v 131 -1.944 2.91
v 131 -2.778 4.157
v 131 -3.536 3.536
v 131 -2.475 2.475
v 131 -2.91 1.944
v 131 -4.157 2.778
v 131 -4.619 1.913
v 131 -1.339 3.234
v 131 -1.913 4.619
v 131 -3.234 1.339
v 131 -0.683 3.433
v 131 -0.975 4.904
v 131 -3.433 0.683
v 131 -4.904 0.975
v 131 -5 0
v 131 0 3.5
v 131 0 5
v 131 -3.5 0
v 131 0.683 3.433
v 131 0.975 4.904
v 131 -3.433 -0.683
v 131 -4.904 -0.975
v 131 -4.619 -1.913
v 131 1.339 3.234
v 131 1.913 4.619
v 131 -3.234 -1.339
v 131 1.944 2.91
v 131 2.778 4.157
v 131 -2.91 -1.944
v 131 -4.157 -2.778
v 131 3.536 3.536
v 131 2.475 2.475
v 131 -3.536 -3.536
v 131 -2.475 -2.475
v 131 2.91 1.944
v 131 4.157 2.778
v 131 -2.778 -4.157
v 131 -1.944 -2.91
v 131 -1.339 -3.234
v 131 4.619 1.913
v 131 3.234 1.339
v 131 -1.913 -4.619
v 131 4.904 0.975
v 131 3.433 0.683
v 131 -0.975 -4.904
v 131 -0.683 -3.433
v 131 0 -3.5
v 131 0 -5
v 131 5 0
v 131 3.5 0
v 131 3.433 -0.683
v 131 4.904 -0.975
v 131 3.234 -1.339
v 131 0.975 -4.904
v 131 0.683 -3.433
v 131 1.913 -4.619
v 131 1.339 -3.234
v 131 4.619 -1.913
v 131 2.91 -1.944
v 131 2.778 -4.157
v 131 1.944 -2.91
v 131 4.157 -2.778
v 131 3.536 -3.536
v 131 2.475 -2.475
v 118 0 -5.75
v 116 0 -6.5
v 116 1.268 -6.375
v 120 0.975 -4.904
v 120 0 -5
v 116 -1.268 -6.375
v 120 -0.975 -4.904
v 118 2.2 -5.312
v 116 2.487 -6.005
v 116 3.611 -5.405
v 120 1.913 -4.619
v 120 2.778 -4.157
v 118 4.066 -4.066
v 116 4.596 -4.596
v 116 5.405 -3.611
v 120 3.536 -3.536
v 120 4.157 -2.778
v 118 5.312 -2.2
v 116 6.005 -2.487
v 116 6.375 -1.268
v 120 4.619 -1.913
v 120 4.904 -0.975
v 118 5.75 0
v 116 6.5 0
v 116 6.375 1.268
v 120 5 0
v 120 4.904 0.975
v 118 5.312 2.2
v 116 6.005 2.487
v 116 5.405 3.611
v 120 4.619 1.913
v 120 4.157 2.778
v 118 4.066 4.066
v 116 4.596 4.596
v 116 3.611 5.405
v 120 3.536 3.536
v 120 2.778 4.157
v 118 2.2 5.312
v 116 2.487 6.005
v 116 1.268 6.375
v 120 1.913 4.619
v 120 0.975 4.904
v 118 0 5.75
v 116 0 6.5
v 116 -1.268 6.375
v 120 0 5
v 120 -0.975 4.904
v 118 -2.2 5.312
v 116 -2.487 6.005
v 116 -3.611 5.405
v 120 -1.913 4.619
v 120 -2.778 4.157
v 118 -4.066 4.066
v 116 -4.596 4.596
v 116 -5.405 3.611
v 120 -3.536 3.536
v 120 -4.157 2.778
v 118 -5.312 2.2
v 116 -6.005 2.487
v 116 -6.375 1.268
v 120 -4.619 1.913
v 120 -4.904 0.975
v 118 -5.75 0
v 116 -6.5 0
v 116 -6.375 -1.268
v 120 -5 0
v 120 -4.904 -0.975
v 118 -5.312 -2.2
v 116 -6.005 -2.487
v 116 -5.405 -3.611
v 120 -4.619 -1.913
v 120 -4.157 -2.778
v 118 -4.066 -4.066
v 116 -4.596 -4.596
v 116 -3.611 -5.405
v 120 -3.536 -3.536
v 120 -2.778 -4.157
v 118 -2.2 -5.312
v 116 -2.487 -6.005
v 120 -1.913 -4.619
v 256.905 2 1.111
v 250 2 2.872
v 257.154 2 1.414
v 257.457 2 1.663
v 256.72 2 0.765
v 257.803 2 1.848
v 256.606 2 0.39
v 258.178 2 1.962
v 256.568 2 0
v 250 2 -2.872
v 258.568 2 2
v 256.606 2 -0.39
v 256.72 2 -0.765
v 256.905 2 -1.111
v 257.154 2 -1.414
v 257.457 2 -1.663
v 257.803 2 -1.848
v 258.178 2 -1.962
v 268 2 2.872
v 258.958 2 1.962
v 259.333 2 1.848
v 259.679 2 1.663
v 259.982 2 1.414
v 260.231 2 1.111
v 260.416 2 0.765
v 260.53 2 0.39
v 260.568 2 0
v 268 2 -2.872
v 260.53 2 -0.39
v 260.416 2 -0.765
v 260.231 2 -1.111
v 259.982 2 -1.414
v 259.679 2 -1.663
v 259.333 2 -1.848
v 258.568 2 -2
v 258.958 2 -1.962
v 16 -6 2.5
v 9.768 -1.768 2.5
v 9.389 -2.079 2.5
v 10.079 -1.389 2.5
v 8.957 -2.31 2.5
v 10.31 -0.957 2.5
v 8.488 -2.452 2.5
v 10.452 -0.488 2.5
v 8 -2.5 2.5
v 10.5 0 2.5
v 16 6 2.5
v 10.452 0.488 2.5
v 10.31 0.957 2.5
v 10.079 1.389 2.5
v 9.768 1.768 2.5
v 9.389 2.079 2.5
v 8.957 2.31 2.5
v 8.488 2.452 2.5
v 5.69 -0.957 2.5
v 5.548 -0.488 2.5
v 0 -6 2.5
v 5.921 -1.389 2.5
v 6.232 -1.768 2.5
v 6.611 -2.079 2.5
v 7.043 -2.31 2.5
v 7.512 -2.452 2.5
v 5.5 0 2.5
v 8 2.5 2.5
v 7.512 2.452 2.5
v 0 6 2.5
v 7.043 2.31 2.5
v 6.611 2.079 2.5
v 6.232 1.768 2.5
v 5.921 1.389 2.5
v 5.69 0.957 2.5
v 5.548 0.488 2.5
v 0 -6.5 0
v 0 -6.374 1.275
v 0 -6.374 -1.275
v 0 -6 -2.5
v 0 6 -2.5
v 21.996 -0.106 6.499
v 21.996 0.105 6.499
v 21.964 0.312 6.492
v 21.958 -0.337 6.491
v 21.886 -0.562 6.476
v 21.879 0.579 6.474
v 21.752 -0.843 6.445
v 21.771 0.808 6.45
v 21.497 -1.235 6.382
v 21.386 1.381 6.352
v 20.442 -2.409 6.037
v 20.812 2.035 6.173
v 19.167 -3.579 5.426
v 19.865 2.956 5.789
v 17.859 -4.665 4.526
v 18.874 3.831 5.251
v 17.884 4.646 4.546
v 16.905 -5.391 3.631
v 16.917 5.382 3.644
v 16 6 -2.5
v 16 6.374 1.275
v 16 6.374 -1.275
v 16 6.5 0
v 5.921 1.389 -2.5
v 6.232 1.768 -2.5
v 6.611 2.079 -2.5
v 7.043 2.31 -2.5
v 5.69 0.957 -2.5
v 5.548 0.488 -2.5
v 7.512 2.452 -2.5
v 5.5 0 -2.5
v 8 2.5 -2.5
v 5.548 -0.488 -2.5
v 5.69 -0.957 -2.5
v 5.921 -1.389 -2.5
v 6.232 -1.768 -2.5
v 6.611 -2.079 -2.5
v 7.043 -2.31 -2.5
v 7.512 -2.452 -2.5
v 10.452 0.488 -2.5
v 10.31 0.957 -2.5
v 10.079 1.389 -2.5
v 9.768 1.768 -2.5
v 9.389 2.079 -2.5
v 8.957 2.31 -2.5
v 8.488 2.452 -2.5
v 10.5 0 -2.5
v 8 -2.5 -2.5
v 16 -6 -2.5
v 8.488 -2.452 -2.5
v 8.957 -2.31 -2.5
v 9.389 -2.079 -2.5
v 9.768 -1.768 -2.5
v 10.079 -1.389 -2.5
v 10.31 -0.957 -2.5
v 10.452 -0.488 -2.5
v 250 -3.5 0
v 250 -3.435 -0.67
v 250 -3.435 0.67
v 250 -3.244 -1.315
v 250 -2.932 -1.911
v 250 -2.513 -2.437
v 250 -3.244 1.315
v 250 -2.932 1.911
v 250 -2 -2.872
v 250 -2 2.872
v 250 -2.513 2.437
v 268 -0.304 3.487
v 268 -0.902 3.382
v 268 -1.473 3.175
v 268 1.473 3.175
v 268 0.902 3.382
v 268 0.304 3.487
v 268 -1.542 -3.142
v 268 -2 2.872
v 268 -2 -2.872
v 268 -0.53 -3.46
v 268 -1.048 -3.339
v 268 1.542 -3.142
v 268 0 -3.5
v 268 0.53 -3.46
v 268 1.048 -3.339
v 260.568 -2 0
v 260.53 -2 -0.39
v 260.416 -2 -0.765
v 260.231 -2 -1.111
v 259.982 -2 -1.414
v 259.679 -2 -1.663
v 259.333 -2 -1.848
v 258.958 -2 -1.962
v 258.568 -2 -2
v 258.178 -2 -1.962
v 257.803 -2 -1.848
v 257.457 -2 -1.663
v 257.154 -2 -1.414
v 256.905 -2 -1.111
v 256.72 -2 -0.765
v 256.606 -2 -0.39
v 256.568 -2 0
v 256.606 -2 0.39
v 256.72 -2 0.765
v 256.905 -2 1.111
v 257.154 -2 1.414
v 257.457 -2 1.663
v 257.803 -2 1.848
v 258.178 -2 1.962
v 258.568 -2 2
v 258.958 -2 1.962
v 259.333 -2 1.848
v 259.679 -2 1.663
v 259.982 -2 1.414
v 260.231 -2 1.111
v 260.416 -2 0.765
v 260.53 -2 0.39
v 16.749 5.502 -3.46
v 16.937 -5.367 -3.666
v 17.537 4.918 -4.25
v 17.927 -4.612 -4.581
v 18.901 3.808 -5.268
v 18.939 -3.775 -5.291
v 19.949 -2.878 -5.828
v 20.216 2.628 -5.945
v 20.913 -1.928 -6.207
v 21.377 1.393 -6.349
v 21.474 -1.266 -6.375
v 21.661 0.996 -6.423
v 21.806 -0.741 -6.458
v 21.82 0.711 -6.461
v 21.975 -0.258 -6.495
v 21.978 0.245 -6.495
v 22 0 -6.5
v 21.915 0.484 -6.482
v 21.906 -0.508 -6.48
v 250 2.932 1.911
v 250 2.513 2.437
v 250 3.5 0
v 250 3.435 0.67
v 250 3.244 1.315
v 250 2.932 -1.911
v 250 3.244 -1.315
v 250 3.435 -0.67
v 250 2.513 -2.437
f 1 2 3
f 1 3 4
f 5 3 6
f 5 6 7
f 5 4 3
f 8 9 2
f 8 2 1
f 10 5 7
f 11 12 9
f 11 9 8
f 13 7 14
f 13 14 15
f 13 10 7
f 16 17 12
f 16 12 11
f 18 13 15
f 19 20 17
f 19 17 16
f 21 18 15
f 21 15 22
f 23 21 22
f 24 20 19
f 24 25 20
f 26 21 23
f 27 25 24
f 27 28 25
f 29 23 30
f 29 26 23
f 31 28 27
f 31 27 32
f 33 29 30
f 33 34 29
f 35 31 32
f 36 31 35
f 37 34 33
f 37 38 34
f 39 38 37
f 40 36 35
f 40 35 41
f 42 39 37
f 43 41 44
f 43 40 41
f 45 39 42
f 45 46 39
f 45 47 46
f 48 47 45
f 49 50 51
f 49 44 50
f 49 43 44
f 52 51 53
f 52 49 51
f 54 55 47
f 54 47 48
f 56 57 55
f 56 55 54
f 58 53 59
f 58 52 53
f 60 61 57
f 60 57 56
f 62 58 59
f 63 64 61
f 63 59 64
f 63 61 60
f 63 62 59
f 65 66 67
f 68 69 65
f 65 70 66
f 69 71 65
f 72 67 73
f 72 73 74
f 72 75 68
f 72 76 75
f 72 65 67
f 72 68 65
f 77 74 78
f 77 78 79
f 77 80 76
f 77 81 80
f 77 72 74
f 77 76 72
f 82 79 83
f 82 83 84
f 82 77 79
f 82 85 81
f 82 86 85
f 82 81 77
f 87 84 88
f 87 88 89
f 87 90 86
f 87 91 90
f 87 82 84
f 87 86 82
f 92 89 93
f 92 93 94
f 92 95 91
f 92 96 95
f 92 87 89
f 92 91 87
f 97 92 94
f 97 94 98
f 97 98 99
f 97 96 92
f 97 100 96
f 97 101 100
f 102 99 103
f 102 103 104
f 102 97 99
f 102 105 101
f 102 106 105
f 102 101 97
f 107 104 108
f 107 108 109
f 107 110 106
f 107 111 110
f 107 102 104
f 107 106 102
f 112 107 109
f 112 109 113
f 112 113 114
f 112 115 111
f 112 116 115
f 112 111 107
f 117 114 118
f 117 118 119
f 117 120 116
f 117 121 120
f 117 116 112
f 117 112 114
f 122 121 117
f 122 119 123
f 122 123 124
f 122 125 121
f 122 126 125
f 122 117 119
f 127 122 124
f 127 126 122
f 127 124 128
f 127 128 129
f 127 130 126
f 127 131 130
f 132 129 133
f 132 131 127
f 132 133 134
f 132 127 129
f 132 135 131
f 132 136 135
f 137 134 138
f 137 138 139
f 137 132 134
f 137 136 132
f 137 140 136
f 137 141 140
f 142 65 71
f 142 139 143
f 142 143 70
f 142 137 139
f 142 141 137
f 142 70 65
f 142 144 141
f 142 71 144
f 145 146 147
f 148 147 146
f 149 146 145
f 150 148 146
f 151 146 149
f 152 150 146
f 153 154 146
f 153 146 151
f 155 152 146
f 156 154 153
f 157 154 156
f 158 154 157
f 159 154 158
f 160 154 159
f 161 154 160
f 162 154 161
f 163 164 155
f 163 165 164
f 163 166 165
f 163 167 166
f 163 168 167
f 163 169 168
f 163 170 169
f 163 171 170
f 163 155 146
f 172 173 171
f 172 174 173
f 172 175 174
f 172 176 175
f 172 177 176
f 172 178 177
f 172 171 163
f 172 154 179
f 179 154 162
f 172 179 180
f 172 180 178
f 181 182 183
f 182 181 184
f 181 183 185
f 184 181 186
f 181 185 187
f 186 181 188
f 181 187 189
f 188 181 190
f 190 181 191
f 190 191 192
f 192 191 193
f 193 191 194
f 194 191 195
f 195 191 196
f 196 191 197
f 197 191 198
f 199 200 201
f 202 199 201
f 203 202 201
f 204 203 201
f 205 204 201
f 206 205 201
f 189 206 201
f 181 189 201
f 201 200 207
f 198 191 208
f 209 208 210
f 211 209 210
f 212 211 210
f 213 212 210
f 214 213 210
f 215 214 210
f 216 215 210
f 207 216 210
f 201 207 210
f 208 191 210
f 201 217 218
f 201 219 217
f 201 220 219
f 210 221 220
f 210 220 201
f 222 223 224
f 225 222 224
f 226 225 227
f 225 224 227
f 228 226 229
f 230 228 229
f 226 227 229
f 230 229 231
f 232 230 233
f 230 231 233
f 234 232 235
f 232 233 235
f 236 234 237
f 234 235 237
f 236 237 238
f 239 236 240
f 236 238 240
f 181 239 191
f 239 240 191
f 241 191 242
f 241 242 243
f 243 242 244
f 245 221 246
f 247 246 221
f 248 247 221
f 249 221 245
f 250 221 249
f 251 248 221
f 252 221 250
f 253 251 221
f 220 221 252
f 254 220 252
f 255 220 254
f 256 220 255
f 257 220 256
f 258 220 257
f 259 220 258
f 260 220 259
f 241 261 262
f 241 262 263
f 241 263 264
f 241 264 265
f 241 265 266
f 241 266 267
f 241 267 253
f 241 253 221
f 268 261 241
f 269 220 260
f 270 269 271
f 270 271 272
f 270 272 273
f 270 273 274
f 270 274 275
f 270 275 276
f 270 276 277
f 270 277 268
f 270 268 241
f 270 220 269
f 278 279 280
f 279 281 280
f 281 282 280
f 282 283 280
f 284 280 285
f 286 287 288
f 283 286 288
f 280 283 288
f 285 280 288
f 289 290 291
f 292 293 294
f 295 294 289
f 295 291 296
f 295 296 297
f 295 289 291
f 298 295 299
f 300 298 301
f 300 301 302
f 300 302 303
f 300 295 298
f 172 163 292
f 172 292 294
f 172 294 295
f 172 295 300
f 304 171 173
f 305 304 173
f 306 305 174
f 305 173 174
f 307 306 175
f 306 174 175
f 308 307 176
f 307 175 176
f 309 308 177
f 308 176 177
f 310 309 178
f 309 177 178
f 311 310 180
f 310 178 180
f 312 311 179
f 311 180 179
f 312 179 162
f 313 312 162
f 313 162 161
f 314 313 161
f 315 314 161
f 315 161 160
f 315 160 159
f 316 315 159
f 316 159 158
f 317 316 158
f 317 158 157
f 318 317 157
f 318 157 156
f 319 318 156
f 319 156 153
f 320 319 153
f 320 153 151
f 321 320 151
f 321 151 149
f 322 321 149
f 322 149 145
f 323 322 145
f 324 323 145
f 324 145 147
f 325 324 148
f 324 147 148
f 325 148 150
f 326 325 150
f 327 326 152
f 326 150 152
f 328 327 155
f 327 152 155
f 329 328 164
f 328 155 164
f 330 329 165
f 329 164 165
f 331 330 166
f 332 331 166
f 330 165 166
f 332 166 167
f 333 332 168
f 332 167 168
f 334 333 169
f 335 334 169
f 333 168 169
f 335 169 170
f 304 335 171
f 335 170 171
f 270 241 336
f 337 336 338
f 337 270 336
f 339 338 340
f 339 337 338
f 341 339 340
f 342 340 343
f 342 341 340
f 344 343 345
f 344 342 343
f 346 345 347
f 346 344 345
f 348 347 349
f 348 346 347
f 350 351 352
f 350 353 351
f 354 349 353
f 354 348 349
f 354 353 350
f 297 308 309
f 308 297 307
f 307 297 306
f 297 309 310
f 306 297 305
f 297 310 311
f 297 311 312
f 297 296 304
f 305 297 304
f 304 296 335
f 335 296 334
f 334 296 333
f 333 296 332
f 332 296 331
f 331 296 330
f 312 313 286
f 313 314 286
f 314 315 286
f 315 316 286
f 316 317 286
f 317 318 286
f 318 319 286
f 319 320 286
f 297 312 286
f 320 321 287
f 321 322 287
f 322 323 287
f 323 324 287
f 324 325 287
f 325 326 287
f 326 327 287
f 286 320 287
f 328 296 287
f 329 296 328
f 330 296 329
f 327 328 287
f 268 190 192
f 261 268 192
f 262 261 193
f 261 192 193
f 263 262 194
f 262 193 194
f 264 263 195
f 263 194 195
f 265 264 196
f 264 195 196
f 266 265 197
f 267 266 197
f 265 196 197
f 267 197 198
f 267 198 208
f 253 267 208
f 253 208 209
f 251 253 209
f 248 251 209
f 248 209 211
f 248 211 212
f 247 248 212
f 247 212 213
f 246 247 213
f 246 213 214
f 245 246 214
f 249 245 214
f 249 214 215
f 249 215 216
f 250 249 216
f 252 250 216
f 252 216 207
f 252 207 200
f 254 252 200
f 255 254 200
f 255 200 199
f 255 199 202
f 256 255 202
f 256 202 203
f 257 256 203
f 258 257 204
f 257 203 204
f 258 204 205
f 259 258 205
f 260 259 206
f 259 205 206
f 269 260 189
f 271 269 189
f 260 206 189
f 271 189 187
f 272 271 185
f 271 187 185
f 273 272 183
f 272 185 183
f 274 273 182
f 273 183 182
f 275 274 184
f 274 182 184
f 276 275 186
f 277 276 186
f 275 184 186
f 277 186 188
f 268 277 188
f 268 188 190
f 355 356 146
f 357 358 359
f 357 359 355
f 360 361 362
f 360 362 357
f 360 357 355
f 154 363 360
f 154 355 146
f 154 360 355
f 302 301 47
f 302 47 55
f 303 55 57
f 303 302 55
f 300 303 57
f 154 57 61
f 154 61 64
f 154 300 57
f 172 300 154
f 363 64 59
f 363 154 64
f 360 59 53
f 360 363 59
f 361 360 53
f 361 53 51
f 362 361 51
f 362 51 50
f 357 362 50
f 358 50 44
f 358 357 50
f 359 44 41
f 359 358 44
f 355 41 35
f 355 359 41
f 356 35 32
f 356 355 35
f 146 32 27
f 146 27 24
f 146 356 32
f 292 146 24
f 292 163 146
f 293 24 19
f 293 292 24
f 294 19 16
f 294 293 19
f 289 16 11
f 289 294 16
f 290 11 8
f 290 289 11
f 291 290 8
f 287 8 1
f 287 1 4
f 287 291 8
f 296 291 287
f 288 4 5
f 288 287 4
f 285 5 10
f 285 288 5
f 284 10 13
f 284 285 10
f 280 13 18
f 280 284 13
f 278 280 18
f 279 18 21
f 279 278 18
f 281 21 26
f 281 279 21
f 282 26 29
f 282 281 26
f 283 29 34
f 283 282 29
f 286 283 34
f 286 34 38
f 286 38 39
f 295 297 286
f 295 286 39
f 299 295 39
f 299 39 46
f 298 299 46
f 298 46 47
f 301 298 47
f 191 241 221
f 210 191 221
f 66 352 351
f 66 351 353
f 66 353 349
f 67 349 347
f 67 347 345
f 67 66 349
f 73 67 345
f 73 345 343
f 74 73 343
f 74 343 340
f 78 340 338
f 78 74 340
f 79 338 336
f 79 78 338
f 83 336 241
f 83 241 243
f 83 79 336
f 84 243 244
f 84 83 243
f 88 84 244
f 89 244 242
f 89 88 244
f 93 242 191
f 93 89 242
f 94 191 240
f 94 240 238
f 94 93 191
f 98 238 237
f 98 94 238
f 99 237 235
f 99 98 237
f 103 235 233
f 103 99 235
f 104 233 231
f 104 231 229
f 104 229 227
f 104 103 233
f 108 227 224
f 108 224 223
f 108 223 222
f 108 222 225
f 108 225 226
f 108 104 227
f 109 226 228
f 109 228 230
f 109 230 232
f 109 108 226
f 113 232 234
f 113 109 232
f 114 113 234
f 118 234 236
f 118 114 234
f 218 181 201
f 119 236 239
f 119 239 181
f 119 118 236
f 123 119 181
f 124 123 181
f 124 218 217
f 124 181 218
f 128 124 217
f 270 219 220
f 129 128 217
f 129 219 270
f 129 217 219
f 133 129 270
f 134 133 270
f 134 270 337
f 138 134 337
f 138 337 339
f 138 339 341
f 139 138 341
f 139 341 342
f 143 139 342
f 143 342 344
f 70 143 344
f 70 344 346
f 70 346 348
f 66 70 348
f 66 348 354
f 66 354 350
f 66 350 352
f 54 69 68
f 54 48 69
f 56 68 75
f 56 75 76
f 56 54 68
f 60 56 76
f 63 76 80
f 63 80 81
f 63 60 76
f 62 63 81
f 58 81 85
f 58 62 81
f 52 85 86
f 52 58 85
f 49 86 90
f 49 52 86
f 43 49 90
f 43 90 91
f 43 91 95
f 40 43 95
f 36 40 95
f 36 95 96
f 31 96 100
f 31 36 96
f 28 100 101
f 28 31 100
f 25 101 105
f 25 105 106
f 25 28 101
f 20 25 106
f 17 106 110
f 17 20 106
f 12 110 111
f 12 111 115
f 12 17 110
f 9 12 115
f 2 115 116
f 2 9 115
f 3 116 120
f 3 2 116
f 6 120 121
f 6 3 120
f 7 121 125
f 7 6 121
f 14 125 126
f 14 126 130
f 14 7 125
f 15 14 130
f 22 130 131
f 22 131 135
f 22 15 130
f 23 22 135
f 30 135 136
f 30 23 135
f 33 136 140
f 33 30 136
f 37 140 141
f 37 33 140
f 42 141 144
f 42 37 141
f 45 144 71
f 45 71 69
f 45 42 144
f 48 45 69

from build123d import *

# Parameters (mm, degrees)
CUT_EXTRUDE1_DEPTH = 21
SKETCH5_W          = 19.327905808
SKETCH5_H          = 9.031167277
CUT_EXTRUDE4_DEPTH = 25
CUT_EXTRUDE5_DEPTH = 5
SKETCH9_R          = 2
CUT_EXTRUDE6_DEPTH = 10
SKETCH10_R         = 2.5
CUT_EXTRUDE7_DEPTH = 10


with BuildPart() as part:
    # Sketch1 → Revolve1 (revolve)
    with BuildSketch(Plane(origin=(0, 0, 0), x_dir=(1, 0, 0), z_dir=(0, 1, 0))):
        Polygon((0, 0), (0, 6.5), (116, 6.5), (120, 5), (131, 5), (131, 3.5), (268, 3.5), (268, 0), align=None)
    revolve(axis=Axis((0, 0, 0), (1, 0, 0)))

    # Sketch2 → Cut-Extrude1 (cut, symmetric)
    with BuildSketch(Plane(origin=(0, 0, 0), x_dir=(1, 0, 0), z_dir=(0, 1, 0))):
        with BuildLine():
            Line((0, 6.5), (0, 2.5))
            Line((0, 2.5), (16, 2.5))
            ThreePointArc((16, 2.5), (18.611709863, 5.082435206), (22, 6.5))
            Line((22, 6.5), (0, 6.5))
        make_face()
        with BuildLine():
            Line((16, -2.5), (0, -2.5))
            Line((0, -2.5), (0, -6.5))
            Line((0, -6.5), (22, -6.5))
            ThreePointArc((22, -6.5), (18.611709863, -5.082435206), (16, -2.5))
        make_face()
    extrude(amount=CUT_EXTRUDE1_DEPTH, both=True, mode=Mode.SUBTRACT)

    # Sketch5 → Cut-Extrude4 (cut)
    with BuildSketch(Plane(origin=(0, 0, -2.5), x_dir=(-1, 0, 0), z_dir=(0, 0, -1))):
        with Locations((-6.336047096, 10.515583639)):
            Rectangle(SKETCH5_W, SKETCH5_H)
    extrude(amount=-CUT_EXTRUDE4_DEPTH, mode=Mode.SUBTRACT)

    # Sketch8 → Cut-Extrude5 (cut, symmetric)
    with BuildSketch(Plane.XY):
        Polygon((250, 2), (275.037154833, 2), (275.037154833, 6.622106016), (250, 7.374727948), align=None)
        Polygon((275.037154833, -10.204370032), (275.037154833, -2), (250, -2), (250, -8.806643588), align=None)
    extrude(amount=CUT_EXTRUDE5_DEPTH, both=True, mode=Mode.SUBTRACT)

    # Sketch9 → Cut-Extrude6 (cut)
    with BuildSketch(Plane(origin=(0, 2, 0), x_dir=(1, 0, 0), z_dir=(0, 1, 0))):
        with Locations((258.568042263, 0)):
            Circle(SKETCH9_R)
    extrude(amount=-CUT_EXTRUDE6_DEPTH, mode=Mode.SUBTRACT)

    # Sketch10 → Cut-Extrude7 (cut)
    with BuildSketch(Plane.XY.offset(2.5)):
        with Locations((8, 0)):
            Circle(SKETCH10_R)
    extrude(amount=-CUT_EXTRUDE7_DEPTH, mode=Mode.SUBTRACT)


solid = part.part
